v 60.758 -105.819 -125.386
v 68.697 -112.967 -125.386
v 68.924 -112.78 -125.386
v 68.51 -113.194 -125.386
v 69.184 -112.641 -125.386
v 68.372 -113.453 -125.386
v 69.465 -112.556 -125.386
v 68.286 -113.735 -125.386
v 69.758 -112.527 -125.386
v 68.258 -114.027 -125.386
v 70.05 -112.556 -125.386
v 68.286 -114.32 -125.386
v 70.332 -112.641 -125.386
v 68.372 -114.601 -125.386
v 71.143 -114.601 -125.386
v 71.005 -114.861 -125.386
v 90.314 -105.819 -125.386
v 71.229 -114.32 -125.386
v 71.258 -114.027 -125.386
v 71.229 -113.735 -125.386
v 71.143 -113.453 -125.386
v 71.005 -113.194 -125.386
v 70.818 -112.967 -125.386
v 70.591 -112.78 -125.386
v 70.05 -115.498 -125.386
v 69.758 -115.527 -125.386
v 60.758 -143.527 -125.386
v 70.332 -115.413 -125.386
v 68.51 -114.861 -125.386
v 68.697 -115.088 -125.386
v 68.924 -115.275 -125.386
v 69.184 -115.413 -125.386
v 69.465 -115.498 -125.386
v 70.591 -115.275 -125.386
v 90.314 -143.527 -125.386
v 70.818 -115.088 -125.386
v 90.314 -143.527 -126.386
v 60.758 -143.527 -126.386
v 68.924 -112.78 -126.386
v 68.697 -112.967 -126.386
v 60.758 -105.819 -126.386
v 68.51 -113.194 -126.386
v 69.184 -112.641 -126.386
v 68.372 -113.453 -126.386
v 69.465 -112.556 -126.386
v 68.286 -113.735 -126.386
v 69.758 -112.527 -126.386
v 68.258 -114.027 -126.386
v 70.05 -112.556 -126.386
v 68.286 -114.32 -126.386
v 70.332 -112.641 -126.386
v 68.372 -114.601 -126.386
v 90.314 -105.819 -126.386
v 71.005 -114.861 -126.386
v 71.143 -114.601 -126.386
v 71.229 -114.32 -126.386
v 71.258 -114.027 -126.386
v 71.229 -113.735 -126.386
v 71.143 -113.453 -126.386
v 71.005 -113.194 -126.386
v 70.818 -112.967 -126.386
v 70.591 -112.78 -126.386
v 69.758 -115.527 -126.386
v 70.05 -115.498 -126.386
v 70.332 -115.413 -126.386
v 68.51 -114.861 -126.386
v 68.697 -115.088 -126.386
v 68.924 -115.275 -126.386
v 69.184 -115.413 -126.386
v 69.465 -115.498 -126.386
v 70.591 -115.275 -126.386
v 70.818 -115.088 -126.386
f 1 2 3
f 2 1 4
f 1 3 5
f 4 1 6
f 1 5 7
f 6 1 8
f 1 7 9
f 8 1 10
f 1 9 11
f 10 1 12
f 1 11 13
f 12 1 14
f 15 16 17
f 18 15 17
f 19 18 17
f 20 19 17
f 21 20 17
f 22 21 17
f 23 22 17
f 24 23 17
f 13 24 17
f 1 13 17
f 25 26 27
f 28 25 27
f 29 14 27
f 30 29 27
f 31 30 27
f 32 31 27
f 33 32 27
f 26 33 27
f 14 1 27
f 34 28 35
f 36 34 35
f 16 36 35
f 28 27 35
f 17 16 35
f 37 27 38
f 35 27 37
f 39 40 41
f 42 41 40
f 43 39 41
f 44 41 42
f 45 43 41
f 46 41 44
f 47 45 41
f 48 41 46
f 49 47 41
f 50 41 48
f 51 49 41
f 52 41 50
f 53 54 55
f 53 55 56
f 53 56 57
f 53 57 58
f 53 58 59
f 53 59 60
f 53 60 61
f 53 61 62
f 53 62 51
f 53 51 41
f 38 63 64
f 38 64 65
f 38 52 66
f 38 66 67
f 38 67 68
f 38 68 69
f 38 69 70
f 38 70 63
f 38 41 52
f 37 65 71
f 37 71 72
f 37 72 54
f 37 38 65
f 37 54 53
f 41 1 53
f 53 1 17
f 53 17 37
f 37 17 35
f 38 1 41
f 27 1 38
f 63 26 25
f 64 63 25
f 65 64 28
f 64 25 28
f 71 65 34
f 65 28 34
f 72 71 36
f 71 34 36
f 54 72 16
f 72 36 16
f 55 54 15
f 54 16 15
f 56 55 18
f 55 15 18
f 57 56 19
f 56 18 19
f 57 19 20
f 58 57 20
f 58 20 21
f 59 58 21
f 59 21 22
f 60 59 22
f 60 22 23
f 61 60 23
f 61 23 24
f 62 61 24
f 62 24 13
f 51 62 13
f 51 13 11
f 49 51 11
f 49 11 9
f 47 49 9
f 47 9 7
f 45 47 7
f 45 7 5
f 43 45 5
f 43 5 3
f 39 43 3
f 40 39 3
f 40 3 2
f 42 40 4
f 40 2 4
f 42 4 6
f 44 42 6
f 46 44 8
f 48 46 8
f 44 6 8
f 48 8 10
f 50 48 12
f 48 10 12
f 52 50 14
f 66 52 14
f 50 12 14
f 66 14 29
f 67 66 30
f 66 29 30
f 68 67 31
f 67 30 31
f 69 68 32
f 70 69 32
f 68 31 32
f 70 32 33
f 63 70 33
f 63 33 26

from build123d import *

# Parameters (mm, degrees)
CIRCLE_R           = 1.5
EXTRUSION002_DEPTH = 51.281793
RECTANGLE_W        = 29.556112
RECTANGLE_H        = 37.708242
EXTRUSION001_DEPTH = 1


with BuildPart() as extrusion002:
    # Circle (on Extrusion) → Extrusion002 (new body)
    with BuildSketch(Plane(origin=(69.75761, -114.027299, -125.386342), x_dir=(0, -1, 0), z_dir=(0, 0, 1))):
        Circle(CIRCLE_R)
    extrude(amount=-EXTRUSION002_DEPTH)


with BuildPart() as cut001:
    # Rectangle (on Cut) → Extrusion001 (new body)
    with BuildSketch(Plane(origin=(60.75761, -105.819057, -125.386342), x_dir=(1, 0, 0), z_dir=(0, 0, -1))):
        with Locations((14.778056, 18.854121)):
            Rectangle(RECTANGLE_W, RECTANGLE_H)
    extrude(amount=EXTRUSION001_DEPTH)

    # Cut001: cut Extrusion002
    add(extrusion002.part, mode=Mode.SUBTRACT)


solid = cut001.part
